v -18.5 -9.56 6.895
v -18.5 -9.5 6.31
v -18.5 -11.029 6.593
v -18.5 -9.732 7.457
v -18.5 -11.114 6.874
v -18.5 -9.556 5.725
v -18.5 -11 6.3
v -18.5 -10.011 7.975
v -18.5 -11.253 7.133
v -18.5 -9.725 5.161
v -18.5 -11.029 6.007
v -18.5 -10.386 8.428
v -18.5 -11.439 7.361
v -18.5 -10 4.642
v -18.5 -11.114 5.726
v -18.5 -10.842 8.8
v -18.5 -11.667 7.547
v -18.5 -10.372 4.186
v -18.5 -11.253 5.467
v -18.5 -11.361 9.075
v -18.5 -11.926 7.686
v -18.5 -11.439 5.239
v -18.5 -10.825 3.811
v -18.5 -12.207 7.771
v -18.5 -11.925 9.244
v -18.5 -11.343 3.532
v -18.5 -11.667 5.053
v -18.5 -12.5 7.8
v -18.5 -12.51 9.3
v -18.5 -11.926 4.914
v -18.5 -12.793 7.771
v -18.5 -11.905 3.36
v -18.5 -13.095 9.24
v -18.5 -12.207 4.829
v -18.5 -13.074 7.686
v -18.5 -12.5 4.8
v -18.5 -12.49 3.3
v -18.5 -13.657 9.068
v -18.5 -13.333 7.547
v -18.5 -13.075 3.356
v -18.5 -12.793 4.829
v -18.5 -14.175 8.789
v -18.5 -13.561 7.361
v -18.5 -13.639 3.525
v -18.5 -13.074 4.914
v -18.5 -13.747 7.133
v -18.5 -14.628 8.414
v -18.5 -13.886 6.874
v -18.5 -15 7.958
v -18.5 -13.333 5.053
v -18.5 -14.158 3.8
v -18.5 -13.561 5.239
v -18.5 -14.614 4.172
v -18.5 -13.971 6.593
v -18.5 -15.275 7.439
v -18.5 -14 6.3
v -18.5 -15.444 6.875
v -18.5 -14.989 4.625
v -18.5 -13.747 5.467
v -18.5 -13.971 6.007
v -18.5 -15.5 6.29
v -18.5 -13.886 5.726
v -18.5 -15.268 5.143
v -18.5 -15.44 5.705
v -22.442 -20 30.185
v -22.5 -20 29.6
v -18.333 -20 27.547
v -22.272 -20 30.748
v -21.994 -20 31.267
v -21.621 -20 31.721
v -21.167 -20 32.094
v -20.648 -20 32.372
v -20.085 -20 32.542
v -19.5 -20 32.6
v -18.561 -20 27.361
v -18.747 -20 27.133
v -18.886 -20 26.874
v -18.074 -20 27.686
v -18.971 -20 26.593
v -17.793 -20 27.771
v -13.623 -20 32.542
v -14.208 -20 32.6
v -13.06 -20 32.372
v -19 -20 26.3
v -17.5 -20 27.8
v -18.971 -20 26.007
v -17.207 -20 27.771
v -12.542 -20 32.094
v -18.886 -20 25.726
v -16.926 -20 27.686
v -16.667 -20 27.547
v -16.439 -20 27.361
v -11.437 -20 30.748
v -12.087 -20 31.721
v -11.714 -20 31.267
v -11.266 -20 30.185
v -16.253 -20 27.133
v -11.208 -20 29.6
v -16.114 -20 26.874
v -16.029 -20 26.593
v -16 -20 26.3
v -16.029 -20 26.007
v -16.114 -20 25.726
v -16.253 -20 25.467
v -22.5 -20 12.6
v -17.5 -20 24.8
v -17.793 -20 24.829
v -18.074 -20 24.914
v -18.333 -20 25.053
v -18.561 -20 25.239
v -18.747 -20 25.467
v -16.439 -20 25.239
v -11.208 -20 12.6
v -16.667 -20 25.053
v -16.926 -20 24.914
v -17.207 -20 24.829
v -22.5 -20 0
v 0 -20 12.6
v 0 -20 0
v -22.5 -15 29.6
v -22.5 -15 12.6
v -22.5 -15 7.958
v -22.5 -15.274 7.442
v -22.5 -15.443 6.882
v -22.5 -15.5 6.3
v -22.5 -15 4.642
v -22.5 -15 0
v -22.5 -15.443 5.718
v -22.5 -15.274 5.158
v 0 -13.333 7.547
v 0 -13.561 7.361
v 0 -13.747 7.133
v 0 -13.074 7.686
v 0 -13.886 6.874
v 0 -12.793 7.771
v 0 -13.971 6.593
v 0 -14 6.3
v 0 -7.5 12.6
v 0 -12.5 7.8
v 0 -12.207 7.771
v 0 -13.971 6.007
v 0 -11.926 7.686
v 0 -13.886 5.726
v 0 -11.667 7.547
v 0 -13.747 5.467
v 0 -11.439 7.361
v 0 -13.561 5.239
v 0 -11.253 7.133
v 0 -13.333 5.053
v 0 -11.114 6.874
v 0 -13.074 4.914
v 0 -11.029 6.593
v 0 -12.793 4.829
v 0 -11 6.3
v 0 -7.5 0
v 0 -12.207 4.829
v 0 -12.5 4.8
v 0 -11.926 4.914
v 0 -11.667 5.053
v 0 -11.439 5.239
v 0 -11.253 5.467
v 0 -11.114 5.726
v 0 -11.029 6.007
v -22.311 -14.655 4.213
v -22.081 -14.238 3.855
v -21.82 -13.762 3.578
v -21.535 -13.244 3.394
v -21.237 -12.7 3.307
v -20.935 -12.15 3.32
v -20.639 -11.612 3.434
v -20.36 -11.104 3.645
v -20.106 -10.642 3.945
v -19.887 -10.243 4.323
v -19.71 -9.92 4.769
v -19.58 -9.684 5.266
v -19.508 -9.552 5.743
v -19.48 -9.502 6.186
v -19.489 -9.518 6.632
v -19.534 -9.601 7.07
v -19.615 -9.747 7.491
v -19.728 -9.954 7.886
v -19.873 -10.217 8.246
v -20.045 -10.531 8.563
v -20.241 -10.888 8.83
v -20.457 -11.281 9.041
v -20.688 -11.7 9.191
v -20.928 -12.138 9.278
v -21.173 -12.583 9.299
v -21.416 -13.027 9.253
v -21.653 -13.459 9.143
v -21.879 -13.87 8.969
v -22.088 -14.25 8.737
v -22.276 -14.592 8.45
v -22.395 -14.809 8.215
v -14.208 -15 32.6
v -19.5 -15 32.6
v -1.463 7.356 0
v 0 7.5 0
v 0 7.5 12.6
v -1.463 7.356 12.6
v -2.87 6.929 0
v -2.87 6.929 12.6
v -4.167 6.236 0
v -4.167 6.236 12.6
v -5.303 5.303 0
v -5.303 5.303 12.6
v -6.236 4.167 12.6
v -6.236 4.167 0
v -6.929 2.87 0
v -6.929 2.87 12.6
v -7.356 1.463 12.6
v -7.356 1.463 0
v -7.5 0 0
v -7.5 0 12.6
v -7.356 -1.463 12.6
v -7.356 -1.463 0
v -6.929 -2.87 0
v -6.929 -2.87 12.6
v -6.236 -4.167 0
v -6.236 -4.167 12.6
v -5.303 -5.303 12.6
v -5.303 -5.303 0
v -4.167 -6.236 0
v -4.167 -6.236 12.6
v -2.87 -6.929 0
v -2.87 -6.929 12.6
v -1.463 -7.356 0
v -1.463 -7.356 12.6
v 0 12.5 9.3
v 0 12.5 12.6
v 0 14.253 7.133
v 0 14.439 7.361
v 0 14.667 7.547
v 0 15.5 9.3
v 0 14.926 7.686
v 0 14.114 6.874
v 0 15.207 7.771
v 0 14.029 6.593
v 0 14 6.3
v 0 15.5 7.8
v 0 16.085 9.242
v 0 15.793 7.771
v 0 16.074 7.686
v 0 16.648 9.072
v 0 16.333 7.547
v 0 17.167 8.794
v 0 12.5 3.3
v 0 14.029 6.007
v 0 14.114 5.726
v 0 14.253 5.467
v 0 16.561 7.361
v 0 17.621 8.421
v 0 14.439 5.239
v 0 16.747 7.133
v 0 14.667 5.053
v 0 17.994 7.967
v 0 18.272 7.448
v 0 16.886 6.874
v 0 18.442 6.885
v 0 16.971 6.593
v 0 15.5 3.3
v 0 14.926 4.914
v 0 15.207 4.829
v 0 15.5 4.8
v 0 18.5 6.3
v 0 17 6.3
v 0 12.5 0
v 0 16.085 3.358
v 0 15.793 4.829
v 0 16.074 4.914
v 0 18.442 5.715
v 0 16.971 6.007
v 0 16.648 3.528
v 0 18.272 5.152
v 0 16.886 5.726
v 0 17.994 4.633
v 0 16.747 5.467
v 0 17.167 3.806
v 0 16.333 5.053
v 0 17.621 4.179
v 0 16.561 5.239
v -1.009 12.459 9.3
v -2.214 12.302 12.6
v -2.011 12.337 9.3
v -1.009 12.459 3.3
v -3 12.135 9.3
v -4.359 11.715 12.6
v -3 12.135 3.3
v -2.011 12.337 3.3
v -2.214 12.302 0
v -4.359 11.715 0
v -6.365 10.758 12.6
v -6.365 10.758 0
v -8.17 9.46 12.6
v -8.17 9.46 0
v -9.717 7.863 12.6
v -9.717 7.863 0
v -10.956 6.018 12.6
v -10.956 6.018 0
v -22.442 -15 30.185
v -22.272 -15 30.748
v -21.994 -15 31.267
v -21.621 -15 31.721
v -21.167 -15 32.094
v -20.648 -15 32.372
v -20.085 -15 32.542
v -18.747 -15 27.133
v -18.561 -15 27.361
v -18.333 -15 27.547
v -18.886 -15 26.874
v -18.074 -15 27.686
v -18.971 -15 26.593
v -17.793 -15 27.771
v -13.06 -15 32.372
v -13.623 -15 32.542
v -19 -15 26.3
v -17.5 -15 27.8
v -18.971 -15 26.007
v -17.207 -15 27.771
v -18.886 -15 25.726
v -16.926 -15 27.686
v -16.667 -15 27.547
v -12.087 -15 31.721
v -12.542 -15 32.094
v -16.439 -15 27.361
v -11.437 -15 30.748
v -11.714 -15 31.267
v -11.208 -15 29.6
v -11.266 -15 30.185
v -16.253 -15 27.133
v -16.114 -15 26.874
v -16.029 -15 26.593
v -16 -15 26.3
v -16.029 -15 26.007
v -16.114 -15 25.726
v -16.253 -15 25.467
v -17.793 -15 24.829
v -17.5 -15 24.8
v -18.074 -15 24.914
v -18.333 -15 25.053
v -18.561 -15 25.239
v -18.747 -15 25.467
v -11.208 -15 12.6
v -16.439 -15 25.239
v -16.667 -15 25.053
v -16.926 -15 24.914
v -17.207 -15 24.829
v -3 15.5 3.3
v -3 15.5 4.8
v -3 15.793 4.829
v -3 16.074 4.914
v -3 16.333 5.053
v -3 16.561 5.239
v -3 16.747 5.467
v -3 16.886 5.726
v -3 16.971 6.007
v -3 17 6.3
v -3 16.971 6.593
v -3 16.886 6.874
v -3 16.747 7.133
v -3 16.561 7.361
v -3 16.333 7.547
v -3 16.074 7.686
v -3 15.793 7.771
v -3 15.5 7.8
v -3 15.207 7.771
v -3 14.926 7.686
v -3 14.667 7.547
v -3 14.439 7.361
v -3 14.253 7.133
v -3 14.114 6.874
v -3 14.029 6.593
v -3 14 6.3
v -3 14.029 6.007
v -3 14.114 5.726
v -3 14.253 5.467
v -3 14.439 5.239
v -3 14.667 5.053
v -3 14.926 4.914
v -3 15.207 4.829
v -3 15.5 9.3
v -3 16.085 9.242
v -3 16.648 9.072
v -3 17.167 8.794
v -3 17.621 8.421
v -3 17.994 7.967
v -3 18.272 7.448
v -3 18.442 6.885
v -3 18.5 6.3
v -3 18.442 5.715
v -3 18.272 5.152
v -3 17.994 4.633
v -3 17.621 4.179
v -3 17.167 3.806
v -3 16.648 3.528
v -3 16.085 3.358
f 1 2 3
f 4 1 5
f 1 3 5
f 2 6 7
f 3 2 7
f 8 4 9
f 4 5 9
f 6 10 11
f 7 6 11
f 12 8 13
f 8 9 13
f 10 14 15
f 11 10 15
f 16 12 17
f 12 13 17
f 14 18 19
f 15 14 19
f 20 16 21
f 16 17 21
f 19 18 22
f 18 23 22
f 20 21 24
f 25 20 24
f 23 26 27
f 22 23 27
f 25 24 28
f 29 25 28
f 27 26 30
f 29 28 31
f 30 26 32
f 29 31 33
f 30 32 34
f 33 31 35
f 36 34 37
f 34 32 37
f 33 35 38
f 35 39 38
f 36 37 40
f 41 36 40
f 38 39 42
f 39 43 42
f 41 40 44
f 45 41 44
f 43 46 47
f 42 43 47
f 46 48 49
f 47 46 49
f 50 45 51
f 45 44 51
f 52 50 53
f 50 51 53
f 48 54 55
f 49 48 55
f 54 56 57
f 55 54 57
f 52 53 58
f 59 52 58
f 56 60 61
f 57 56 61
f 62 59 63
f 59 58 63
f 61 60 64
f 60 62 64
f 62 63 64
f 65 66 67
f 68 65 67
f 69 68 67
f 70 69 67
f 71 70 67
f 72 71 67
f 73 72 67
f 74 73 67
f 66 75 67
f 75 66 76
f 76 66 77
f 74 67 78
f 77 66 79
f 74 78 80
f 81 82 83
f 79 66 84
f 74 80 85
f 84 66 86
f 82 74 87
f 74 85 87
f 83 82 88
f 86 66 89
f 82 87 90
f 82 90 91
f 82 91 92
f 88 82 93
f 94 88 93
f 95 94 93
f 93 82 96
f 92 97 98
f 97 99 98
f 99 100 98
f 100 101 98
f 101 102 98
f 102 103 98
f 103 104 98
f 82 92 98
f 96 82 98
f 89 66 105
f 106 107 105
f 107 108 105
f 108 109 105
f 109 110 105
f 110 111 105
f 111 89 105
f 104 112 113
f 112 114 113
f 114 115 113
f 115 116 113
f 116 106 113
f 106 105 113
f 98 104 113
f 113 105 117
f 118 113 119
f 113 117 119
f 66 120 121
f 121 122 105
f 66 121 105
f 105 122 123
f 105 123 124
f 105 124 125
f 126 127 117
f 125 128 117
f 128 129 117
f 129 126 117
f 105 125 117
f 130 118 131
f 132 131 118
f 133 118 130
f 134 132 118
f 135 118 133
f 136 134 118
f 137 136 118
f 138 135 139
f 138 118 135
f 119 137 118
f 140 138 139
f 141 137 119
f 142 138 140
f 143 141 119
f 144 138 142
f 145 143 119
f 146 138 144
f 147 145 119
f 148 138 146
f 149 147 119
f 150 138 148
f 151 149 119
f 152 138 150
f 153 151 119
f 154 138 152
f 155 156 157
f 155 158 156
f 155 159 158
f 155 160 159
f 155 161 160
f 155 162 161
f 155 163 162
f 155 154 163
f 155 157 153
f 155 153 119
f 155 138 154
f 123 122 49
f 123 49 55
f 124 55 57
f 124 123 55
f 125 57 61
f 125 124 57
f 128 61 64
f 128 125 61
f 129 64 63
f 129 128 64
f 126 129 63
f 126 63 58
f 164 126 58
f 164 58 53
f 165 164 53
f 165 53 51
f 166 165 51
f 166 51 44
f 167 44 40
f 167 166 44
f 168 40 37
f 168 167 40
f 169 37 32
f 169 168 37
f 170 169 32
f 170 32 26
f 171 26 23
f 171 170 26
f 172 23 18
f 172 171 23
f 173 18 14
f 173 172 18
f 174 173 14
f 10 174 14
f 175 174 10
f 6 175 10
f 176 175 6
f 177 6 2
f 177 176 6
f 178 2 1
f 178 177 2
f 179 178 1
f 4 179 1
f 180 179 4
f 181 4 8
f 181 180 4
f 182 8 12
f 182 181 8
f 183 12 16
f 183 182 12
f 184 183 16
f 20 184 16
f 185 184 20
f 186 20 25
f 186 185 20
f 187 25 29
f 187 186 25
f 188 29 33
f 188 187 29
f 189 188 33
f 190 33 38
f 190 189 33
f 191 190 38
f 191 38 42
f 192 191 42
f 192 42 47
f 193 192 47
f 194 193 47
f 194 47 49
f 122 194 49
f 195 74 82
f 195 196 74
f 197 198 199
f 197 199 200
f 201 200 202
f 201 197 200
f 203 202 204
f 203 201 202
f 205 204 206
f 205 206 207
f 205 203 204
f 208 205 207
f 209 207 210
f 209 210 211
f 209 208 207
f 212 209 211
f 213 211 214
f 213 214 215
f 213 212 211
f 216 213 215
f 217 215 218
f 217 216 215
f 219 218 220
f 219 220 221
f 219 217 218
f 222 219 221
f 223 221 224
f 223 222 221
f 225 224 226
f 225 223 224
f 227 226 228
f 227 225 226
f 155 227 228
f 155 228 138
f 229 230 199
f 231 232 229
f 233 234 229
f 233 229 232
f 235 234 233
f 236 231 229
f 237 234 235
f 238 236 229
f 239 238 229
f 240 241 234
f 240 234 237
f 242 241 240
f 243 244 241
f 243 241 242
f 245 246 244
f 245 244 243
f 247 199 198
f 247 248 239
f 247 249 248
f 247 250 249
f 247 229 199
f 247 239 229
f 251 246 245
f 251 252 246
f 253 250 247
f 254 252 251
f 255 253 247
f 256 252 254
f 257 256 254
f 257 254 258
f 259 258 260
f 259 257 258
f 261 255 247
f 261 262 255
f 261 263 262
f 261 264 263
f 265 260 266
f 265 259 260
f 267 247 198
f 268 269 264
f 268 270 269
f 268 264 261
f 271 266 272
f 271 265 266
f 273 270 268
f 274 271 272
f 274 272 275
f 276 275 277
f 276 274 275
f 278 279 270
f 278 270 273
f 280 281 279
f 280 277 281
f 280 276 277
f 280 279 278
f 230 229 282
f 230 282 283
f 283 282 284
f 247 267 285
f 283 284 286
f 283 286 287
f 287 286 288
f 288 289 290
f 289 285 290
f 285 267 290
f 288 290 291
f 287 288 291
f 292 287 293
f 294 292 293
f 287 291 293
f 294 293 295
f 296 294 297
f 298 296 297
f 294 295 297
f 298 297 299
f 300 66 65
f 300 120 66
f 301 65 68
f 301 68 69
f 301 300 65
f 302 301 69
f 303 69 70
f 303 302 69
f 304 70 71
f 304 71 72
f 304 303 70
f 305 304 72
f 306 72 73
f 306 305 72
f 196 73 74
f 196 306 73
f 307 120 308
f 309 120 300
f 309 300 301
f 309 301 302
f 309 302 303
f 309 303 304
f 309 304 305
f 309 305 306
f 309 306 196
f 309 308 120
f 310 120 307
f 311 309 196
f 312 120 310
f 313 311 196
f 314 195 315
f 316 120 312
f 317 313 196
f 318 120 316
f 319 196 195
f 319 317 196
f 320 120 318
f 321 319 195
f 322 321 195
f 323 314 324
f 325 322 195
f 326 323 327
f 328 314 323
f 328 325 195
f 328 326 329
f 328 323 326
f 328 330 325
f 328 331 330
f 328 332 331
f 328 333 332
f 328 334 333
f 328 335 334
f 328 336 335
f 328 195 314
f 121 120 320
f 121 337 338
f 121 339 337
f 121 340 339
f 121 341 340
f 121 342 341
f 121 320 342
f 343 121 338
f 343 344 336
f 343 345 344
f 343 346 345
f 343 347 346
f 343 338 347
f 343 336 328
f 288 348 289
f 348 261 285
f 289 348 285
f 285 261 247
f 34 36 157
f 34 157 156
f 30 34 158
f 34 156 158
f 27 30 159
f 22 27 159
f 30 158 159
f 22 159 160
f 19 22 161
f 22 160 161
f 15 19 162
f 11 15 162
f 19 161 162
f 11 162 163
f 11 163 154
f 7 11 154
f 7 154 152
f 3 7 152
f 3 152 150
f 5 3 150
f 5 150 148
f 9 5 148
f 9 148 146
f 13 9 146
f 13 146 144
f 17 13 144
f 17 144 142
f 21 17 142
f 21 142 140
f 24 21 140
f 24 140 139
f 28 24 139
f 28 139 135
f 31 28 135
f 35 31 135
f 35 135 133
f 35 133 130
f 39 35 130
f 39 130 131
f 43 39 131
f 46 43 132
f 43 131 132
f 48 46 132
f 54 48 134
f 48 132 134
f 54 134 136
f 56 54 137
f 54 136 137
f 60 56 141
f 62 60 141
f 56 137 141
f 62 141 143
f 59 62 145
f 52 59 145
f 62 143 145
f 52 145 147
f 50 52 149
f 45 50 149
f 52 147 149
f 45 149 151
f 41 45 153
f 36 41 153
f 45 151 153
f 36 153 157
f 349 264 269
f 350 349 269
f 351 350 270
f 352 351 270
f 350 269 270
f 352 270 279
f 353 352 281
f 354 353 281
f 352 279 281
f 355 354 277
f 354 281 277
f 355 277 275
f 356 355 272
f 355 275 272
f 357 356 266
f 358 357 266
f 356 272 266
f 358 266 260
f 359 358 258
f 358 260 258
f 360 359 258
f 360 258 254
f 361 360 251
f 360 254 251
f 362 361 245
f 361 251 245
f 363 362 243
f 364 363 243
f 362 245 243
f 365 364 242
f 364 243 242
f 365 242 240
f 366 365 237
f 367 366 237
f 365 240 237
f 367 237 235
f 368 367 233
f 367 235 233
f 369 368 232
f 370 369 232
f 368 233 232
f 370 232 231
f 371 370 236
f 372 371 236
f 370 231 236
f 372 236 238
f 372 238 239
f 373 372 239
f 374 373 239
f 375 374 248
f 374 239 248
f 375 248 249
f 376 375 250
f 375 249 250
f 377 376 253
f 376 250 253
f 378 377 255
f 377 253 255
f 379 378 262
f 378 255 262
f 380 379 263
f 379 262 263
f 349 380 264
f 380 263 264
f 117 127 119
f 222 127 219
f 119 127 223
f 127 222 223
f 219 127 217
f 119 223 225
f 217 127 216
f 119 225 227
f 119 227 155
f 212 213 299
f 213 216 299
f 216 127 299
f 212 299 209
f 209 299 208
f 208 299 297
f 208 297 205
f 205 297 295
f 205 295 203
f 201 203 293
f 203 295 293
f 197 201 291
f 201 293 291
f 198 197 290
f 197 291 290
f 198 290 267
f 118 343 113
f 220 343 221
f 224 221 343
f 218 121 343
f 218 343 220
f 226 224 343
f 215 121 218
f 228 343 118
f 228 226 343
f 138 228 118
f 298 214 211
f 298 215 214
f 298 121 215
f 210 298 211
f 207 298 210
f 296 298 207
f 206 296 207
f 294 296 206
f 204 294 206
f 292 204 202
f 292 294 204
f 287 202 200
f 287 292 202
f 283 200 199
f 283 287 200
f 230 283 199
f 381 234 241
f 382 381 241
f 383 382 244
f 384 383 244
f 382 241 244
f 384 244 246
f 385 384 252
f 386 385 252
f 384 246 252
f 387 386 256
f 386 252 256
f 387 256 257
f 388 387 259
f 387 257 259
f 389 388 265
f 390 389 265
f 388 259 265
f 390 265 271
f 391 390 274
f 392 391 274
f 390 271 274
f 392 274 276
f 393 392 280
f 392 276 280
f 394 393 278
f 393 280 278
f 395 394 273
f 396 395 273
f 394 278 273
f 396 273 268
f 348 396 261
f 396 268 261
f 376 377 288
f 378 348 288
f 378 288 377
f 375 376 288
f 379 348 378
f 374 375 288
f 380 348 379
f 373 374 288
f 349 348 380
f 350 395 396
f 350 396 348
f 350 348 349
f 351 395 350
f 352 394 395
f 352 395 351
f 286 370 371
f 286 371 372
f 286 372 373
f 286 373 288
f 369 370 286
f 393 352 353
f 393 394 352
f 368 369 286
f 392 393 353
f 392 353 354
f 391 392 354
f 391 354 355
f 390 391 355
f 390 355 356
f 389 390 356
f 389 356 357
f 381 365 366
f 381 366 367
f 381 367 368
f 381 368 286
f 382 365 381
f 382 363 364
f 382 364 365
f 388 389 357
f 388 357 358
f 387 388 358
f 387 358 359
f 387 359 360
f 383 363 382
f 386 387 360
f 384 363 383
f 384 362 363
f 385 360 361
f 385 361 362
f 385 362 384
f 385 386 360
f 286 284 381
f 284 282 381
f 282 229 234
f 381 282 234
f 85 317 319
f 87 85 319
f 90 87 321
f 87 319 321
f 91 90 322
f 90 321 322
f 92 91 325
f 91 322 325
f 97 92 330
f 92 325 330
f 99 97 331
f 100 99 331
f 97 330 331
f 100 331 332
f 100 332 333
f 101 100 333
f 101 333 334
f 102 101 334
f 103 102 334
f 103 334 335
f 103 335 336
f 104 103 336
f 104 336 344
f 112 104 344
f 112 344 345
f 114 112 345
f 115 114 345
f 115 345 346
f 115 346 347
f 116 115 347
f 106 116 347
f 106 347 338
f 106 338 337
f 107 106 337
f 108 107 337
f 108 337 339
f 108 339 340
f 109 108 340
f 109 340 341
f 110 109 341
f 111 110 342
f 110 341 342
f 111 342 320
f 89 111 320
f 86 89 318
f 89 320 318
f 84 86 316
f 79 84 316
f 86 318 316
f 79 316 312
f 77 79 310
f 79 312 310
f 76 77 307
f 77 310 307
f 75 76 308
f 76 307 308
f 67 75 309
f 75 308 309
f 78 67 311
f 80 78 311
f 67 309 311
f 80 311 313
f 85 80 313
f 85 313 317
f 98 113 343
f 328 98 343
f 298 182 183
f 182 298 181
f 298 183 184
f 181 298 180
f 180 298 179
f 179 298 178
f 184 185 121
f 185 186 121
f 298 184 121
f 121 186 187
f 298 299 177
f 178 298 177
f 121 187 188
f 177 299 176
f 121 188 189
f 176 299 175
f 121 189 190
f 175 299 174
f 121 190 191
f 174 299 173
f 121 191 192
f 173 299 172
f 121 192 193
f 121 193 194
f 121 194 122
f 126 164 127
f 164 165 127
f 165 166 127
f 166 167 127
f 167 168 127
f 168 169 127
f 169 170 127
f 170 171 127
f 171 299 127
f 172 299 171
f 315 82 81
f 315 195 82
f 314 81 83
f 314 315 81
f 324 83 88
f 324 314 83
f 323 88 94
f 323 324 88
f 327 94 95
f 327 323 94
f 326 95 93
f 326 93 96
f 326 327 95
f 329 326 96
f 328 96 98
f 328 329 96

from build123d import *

# Parameters (mm, degrees)
SKETCH_1_R          = 7.5
EXTRUDE_1_DEPTH     = 12.6
SKETCH_2_W          = 11.291748881
SKETCH_2_H          = 5
EXTRUDE_2_DEPTH     = 32.6
SKETCH_3_R          = 1.5
CUT_EXTRUDE_1_DEPTH = 45.373528145
FILLET_1_R          = 3
SKETCH_4_W          = 3
SKETCH_4_H          = 15
EXTRUDE_3_DEPTH     = 20
SKETCH_5_R          = 1.3
CUT_EXTRUDE_2_DEPTH = 46.967488511
SKETCH_6_W          = 36.00279958
SKETCH_6_H          = 34.73430716
CUT_EXTRUDE_3_DEPTH = 46.967488511
SKETCH_7_R          = 1.5
EXTRUDE_4_DEPTH     = 3
SKETCH_8_R          = 1.5
CUT_EXTRUDE_4_DEPTH = 45.373528145
SKETCH_9_R          = 3
CUT_EXTRUDE_5_DEPTH = 4


with BuildPart() as part:
    # 草图1 → 凸台-拉伸1 (new body)
    with BuildSketch(Plane.XY):
        with BuildLine():
            Line((-10.956194261, 6.017624724), (-22.5, -15))
            Line((-22.5, -15), (-22.5, -20))
            Line((-22.5, -20), (22.5, -20))
            Line((22.5, -20), (22.5, -15))
            Line((22.5, -15), (10.956194261, 6.017624724))
            ThreePointArc((10.956194261, 6.017624724), (0, 12.5), (-10.956194261, 6.017624724))
        make_face()
        Circle(SKETCH_1_R, mode=Mode.SUBTRACT)
    extrude(amount=EXTRUDE_1_DEPTH)

    # 草图2 → 凸台-拉伸2 (add)
    with BuildSketch(Plane.XY):
        with Locations((-16.854125559, -17.5)):
            Rectangle(SKETCH_2_W, SKETCH_2_H)
        with Locations((16.854125559, -17.5)):
            Rectangle(SKETCH_2_W, SKETCH_2_H)
    extrude(amount=EXTRUDE_2_DEPTH)

    # 草图3 → 切除-拉伸1 (cut, through all)
    with BuildSketch(Plane(origin=(0, 0, 0), x_dir=(1, 0, 0), z_dir=(0, 1, 0))):
        with Locations(Location((-17.5, -26.3, 0), (0, 0, 270))):
            Circle(SKETCH_3_R)
        with Locations((17.5, -26.3)):
            Circle(SKETCH_3_R)
    extrude(amount=-CUT_EXTRUDE_1_DEPTH, mode=Mode.SUBTRACT)

    # 圆角1
    fillet_1_edges = [part.edges().sort_by_distance(p)[0] for p in [
        (-22.5, -17.5, 32.6),
        (-11.208251119, -17.5, 32.6),
        (11.208251119, -17.5, 32.6),
    ]]
    fillet(fillet_1_edges, radius=FILLET_1_R)

    # 草图4 → 凸台-拉伸3 (add, through all)
    with BuildSketch(Plane(origin=(0, 0, 0), x_dir=(1, 0, 0), z_dir=(0, 1, 0))):
        with Locations((24, -25.1)):
            Rectangle(SKETCH_4_W, SKETCH_4_H)
    extrude(amount=-EXTRUDE_3_DEPTH)

    # 草图5 → 切除-拉伸2 (cut, through all)
    with BuildSketch(Plane(origin=(0, 0, 0), x_dir=(0, 0, -1), z_dir=(1, 0, 0))):
        with Locations(Location((-25.1, -3, 0), (0, 0, 180))):
            Circle(SKETCH_5_R)
        with Locations(Location((-25.1, -12.5, 0), (0, 0, 180))):
            Circle(SKETCH_5_R)
    extrude(amount=CUT_EXTRUDE_2_DEPTH, mode=Mode.SUBTRACT)

    # 草图6 → 切除-拉伸3 (cut, through all)
    with BuildSketch(Plane(origin=(0, 0, 0), x_dir=(0, 0, -1), z_dir=(1, 0, 0))):
        with Locations((-15.759025291, -4.011160204)):
            Rectangle(SKETCH_6_W, SKETCH_6_H)
    extrude(amount=CUT_EXTRUDE_3_DEPTH, mode=Mode.SUBTRACT)

    # 草图7 → 凸台-拉伸4 (add)
    with BuildSketch(Plane(origin=(0, 0, 0), x_dir=(0, 0, -1), z_dir=(1, 0, 0))):
        with BuildLine():
            Line((-9.3, 7.5), (-9.3, 12.5))
            Line((-9.3, 12.5), (-9.3, 15.5))
            ThreePointArc((-9.3, 15.5), (-6.3, 18.5), (-3.3, 15.5))
            Line((-3.3, 15.5), (-3.3, 7.5))
            Line((-3.3, 7.5), (-9.3, 7.5))
        make_face()
        with Locations((-6.3, 15.5)):
            Circle(SKETCH_7_R, mode=Mode.SUBTRACT)
    extrude(amount=-EXTRUDE_4_DEPTH)

    # 草图8 → 切除-拉伸4 (cut, through all)
    with BuildSketch(Plane(origin=(0, 0, 0), x_dir=(0, 0, -1), z_dir=(1, 0, 0))):
        with Locations((-6.3, -12.5)):
            Circle(SKETCH_8_R)
    extrude(amount=-CUT_EXTRUDE_4_DEPTH, mode=Mode.SUBTRACT)

    # 草图9 → 切除-拉伸5 (cut)
    with BuildSketch(Plane(origin=(-22.5, 0, 0), x_dir=(0, 0, -1), z_dir=(1, 0, 0))):
        with Locations(Location((-6.3, -12.5, 0), (0, 0, 236.442690238))):
            Circle(SKETCH_9_R)
    extrude(amount=CUT_EXTRUDE_5_DEPTH, mode=Mode.SUBTRACT)


solid = part.part
